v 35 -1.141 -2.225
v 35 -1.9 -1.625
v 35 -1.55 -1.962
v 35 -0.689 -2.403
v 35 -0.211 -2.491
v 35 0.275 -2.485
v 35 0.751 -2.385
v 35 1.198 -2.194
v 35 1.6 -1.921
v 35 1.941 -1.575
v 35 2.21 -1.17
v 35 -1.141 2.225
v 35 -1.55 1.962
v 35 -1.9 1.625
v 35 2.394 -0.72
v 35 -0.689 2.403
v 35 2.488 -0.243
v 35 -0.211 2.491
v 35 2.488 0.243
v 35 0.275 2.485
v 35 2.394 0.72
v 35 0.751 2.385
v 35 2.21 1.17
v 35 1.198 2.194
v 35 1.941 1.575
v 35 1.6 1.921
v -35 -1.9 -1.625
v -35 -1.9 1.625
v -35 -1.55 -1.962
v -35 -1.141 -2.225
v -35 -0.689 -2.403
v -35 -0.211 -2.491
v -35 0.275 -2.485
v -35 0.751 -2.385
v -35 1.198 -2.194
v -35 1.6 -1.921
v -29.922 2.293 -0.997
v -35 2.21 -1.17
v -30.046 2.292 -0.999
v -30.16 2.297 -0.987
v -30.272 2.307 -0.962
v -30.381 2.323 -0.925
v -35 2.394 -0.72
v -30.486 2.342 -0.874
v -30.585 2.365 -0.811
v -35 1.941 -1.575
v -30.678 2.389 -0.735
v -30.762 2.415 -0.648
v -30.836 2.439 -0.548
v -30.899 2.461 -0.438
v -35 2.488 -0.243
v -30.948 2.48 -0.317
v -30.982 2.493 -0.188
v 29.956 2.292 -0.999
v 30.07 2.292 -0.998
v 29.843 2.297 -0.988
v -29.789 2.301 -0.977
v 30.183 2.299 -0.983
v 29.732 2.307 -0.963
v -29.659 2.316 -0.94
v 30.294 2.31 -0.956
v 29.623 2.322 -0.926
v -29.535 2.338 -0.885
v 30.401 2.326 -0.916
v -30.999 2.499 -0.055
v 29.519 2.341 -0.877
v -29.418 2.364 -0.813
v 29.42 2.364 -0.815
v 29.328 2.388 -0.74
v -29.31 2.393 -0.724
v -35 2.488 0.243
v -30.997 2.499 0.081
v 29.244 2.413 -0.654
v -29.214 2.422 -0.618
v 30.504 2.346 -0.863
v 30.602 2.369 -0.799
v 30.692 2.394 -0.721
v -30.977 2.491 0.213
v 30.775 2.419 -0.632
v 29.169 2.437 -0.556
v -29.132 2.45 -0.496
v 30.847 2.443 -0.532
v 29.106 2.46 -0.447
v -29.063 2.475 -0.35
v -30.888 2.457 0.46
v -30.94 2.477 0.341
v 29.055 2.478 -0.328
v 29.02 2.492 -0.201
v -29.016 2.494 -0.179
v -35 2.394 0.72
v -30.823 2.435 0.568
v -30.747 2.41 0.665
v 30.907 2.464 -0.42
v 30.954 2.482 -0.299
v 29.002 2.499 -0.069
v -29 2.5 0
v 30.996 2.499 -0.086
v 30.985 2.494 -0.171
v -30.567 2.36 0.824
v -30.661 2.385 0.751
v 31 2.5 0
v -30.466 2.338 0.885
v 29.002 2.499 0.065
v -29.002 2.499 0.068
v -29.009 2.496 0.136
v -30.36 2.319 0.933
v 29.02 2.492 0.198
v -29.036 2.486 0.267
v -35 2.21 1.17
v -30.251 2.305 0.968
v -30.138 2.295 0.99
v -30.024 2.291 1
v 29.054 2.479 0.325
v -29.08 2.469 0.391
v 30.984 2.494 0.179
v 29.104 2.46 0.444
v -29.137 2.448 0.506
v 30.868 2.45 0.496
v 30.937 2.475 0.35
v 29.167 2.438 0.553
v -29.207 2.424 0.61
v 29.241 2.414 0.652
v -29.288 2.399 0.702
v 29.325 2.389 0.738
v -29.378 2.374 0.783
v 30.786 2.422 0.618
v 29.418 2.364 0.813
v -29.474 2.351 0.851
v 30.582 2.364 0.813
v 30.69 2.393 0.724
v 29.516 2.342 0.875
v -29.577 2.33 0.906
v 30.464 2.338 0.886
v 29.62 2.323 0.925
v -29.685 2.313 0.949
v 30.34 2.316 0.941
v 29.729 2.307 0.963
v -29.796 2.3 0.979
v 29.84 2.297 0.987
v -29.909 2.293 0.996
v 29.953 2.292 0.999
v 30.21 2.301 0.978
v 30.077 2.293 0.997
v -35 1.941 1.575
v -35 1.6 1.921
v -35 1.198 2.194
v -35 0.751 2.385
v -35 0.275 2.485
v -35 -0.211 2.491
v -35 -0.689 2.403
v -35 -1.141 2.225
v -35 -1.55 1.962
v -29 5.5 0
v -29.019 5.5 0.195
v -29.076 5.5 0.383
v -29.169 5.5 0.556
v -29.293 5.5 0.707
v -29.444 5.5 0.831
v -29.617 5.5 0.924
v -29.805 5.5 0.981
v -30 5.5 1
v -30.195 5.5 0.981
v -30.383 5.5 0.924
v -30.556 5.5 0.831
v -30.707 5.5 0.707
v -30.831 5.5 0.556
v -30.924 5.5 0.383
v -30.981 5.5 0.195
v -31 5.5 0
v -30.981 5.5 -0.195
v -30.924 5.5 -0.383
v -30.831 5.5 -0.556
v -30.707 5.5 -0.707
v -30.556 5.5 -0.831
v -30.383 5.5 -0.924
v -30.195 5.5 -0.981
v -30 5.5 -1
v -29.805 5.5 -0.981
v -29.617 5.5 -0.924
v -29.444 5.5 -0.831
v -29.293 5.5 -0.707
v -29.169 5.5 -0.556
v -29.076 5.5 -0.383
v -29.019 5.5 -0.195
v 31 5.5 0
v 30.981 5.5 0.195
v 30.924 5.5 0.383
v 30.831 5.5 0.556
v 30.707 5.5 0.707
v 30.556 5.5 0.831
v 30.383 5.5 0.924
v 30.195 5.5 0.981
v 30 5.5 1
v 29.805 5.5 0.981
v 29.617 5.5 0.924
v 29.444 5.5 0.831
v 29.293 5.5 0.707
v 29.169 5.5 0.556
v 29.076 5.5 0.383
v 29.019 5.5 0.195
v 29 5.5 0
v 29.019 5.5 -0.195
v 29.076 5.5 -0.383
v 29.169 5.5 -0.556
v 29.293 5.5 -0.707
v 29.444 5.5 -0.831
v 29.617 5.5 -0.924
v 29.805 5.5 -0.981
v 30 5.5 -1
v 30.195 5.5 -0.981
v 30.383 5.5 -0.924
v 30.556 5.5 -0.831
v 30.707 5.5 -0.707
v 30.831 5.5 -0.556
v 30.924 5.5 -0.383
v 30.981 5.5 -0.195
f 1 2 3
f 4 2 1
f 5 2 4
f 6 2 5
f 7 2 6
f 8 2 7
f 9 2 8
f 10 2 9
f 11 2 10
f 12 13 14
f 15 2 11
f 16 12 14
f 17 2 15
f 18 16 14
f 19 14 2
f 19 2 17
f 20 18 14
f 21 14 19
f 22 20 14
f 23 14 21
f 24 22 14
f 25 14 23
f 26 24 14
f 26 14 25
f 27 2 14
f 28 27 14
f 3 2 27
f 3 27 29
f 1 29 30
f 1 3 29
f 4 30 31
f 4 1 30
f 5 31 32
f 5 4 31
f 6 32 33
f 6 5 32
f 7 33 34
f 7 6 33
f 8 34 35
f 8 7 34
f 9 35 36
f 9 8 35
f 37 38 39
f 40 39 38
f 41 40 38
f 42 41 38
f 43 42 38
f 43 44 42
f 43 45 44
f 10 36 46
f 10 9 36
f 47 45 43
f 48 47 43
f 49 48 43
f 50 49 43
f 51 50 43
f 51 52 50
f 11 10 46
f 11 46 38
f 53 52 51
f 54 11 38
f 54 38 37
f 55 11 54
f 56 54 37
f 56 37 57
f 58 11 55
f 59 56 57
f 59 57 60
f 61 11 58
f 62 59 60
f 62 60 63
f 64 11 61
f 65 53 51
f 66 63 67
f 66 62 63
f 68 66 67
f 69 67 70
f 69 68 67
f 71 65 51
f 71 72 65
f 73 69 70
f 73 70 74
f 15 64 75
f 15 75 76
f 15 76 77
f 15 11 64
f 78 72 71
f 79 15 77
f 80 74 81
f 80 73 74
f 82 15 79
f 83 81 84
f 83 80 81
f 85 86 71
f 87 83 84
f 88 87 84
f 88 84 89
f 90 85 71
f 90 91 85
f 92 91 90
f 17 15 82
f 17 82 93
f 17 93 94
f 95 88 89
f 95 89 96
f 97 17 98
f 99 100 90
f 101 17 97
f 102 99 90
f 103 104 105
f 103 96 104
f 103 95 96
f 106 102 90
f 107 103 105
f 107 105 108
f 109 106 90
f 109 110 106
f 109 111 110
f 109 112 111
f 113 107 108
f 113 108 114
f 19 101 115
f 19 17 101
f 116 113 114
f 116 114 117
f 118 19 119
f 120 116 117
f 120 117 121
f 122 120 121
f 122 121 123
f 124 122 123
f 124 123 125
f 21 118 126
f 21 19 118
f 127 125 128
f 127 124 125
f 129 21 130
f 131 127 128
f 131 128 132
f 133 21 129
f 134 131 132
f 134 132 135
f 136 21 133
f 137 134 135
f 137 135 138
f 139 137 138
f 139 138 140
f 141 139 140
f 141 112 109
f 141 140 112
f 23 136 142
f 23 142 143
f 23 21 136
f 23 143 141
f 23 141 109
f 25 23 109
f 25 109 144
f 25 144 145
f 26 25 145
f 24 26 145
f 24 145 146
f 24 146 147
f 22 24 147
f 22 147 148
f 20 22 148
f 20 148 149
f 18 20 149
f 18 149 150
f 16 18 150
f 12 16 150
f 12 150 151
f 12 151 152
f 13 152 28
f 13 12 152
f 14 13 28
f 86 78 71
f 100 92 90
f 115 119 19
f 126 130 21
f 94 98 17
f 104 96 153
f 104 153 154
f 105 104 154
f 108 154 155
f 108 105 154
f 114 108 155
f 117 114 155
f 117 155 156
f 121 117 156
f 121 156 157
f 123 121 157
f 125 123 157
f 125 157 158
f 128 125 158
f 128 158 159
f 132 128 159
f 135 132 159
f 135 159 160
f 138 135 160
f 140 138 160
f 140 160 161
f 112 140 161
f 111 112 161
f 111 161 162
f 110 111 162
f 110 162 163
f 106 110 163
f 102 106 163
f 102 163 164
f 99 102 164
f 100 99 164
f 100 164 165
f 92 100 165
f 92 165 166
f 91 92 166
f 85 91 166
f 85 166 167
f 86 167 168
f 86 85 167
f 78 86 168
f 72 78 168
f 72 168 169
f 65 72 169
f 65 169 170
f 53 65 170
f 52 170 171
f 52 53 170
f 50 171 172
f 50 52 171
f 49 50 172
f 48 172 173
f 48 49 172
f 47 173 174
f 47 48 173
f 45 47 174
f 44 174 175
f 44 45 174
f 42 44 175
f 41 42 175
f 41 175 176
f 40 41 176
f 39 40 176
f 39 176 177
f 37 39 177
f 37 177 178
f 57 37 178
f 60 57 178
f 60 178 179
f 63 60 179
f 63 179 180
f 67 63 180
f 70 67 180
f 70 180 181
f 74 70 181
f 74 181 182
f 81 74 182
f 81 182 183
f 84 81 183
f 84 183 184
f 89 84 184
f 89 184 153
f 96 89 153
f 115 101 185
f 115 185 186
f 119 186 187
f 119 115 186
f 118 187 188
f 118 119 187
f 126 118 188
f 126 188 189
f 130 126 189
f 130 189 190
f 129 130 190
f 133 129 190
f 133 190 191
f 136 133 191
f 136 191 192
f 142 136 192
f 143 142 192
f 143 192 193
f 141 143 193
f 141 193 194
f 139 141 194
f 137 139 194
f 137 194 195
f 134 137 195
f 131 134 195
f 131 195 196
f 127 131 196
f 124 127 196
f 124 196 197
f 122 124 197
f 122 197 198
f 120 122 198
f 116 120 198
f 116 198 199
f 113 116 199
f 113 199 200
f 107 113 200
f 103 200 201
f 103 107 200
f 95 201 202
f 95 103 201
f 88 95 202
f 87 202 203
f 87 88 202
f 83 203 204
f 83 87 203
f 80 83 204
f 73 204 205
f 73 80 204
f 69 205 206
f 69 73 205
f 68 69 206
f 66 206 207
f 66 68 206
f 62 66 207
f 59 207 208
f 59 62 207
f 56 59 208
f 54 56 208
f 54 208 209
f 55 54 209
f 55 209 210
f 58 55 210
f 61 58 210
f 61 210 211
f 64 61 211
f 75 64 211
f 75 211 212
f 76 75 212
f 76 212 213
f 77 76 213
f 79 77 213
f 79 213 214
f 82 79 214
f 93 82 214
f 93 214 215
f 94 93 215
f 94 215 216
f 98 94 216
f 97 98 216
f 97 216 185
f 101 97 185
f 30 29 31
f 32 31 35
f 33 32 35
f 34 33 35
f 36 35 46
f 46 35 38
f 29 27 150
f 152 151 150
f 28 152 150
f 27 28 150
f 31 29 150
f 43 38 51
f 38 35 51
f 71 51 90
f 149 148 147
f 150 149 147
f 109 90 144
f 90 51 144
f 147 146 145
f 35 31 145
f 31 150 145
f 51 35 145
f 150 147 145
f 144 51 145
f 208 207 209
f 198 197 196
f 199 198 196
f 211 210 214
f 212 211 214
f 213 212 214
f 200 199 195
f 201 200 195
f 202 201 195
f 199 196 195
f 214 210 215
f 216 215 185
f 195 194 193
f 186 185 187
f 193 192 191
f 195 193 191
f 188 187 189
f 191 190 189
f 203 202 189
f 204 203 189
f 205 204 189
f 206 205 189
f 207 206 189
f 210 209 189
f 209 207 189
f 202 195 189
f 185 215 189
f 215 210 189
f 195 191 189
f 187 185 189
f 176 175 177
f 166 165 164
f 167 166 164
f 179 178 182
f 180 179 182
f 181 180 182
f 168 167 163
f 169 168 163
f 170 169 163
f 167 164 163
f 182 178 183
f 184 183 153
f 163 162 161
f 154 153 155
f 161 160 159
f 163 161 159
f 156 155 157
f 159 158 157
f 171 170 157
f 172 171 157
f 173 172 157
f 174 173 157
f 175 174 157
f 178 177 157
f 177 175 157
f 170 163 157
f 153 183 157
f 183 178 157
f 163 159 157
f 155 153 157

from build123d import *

# Parameters (mm, degrees)
F0_R     = 2.5
F1_DEPTH = 35
F2_R     = 1
F3_DEPTH = 5.5
F5_DEPTH = 70.0010001


with BuildPart() as f1:
    # F0 (on Right) → F1 (new body, symmetric)
    with BuildSketch(Plane.YZ):
        Circle(F0_R)
    extrude(amount=F1_DEPTH, both=True)

    # F2 (on Front) → F3 (join)
    with BuildSketch(Plane.XZ):
        with Locations((-30, 0)):
            Circle(F2_R)
        with Locations((30, 0)):
            Circle(F2_R)
    extrude(amount=-F3_DEPTH)

    # F4 (on face) → F5 (cut, through all)
    with BuildSketch(Plane.YZ.offset(35)):
        with BuildLine():
            Line((-1.9, -1.6248076809), (-1.9, 1.6248076809))
            ThreePointArc((-1.9, 1.6248076809), (-2.5, 0), (-1.9, -1.6248076809))
        make_face()
    extrude(amount=-F5_DEPTH, mode=Mode.SUBTRACT)


solid = f1.part
